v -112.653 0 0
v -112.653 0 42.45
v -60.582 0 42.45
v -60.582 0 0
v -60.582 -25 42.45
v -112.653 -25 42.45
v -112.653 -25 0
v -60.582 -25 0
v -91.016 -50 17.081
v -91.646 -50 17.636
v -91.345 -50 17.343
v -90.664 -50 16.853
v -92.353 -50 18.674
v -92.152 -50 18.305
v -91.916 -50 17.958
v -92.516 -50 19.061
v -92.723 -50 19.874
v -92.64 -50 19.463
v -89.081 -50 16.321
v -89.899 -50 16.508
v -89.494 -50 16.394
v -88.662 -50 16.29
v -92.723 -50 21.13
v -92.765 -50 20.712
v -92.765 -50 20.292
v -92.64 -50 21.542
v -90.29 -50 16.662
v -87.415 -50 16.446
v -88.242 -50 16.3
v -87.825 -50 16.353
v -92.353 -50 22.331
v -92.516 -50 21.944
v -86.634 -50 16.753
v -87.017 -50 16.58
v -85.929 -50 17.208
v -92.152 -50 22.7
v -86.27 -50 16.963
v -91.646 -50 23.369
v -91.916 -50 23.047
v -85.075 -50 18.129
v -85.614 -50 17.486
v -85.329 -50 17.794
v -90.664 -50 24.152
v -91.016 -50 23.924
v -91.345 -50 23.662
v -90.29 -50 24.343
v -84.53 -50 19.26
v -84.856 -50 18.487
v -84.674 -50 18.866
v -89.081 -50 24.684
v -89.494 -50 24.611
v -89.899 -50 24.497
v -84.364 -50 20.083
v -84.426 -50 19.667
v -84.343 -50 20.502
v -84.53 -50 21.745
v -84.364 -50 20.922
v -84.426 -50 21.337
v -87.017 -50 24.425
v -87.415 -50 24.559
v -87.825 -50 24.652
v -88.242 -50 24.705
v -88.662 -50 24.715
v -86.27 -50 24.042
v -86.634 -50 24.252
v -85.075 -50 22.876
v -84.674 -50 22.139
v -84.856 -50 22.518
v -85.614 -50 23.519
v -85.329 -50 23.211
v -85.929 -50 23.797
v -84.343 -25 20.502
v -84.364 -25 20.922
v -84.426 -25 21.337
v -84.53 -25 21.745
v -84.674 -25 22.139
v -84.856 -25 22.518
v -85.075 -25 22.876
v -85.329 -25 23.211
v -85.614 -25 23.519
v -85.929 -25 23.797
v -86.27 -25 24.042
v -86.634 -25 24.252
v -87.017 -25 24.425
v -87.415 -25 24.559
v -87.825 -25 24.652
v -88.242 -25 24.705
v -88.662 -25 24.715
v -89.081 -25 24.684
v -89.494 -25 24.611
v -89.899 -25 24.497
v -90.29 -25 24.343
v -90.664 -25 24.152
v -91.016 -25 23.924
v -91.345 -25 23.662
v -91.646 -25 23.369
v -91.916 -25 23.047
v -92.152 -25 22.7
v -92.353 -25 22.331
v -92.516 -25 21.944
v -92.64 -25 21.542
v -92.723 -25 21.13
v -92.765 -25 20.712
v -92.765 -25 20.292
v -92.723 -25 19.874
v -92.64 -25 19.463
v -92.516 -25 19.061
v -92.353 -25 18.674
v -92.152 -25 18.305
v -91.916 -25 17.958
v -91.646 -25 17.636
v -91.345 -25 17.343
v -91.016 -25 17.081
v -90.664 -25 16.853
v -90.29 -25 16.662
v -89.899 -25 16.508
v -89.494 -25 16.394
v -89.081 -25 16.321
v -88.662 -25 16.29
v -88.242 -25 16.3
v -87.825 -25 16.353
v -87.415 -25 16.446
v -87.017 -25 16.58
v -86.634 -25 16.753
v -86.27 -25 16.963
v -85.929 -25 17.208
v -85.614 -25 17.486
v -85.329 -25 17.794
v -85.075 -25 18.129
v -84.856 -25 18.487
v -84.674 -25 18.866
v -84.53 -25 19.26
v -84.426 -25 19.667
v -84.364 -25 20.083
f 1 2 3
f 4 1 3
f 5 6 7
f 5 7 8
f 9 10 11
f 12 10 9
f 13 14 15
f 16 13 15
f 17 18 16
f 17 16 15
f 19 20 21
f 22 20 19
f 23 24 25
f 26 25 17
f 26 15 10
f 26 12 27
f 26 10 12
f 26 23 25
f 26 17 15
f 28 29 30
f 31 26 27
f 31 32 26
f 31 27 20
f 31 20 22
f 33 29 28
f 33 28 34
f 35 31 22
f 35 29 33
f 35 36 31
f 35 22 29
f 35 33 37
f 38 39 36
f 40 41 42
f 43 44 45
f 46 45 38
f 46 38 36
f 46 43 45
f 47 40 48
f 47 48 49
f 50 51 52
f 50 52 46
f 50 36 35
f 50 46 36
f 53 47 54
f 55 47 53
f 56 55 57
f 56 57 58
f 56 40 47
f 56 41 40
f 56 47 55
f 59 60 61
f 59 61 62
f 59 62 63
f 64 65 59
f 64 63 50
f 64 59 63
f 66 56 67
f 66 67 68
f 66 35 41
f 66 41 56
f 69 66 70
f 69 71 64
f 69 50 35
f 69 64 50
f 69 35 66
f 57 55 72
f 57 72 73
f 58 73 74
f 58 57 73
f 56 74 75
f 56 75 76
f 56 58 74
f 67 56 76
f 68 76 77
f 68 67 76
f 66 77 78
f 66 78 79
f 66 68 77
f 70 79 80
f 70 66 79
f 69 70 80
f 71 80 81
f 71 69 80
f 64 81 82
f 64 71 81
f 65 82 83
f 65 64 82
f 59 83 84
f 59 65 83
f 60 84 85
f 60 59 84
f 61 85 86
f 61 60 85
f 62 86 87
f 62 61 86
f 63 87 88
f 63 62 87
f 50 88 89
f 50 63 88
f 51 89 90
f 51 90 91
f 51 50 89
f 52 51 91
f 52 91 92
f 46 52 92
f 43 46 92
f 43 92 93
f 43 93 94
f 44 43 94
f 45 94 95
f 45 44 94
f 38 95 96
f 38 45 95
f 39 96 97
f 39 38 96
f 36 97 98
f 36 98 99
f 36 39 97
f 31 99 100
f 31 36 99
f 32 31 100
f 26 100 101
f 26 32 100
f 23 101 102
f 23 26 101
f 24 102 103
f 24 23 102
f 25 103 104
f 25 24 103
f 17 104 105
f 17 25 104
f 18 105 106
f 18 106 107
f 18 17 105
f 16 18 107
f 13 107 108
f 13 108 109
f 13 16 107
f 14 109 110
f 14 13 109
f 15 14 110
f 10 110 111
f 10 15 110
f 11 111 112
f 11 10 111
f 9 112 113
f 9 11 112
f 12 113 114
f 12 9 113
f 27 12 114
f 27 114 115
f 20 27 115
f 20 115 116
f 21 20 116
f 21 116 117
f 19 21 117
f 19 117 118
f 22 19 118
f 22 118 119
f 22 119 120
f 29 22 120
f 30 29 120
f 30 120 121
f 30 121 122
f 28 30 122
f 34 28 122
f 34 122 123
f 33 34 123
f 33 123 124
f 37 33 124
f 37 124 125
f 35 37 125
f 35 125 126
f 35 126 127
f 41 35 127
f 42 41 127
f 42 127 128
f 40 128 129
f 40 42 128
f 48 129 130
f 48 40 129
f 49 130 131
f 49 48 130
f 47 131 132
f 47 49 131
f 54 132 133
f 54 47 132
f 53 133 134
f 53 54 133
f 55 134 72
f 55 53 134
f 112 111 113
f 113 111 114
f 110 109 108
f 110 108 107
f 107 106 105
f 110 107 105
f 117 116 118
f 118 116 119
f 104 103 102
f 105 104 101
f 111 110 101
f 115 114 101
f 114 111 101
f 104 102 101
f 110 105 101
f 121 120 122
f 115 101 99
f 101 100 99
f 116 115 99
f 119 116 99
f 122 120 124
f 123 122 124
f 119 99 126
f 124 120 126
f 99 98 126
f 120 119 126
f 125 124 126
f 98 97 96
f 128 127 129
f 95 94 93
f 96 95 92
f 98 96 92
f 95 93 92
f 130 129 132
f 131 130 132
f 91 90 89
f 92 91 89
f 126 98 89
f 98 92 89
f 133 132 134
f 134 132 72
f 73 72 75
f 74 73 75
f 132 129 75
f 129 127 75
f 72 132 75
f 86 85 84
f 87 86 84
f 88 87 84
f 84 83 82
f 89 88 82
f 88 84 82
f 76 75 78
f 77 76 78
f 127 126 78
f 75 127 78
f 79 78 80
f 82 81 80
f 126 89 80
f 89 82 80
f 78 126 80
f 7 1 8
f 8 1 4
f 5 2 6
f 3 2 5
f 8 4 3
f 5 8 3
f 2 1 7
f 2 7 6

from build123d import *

# Parameters (mm, degrees)
F0_W     = 52.0707964897
F0_H     = 42.4502529204
F1_DEPTH = 25
F3_R     = 4.2138559649
F4_DEPTH = 25


with BuildPart() as f1:
    # F0 (on Front) → F1 (new body)
    with BuildSketch(Plane.XZ):
        with Locations((-86.6177603602, 21.2251264602)):
            Rectangle(F0_W, F0_H)
    extrude(amount=F1_DEPTH)


with BuildPart() as f4:
    # F3 (on offset) → F4 (new body, through all)
    with BuildSketch(Plane.XZ.offset(50)):
        with Locations((-88.5565727949, 20.5024555326)):
            Circle(F3_R)
    extrude(amount=-F4_DEPTH)


solid = Compound([f1.part, f4.part])
